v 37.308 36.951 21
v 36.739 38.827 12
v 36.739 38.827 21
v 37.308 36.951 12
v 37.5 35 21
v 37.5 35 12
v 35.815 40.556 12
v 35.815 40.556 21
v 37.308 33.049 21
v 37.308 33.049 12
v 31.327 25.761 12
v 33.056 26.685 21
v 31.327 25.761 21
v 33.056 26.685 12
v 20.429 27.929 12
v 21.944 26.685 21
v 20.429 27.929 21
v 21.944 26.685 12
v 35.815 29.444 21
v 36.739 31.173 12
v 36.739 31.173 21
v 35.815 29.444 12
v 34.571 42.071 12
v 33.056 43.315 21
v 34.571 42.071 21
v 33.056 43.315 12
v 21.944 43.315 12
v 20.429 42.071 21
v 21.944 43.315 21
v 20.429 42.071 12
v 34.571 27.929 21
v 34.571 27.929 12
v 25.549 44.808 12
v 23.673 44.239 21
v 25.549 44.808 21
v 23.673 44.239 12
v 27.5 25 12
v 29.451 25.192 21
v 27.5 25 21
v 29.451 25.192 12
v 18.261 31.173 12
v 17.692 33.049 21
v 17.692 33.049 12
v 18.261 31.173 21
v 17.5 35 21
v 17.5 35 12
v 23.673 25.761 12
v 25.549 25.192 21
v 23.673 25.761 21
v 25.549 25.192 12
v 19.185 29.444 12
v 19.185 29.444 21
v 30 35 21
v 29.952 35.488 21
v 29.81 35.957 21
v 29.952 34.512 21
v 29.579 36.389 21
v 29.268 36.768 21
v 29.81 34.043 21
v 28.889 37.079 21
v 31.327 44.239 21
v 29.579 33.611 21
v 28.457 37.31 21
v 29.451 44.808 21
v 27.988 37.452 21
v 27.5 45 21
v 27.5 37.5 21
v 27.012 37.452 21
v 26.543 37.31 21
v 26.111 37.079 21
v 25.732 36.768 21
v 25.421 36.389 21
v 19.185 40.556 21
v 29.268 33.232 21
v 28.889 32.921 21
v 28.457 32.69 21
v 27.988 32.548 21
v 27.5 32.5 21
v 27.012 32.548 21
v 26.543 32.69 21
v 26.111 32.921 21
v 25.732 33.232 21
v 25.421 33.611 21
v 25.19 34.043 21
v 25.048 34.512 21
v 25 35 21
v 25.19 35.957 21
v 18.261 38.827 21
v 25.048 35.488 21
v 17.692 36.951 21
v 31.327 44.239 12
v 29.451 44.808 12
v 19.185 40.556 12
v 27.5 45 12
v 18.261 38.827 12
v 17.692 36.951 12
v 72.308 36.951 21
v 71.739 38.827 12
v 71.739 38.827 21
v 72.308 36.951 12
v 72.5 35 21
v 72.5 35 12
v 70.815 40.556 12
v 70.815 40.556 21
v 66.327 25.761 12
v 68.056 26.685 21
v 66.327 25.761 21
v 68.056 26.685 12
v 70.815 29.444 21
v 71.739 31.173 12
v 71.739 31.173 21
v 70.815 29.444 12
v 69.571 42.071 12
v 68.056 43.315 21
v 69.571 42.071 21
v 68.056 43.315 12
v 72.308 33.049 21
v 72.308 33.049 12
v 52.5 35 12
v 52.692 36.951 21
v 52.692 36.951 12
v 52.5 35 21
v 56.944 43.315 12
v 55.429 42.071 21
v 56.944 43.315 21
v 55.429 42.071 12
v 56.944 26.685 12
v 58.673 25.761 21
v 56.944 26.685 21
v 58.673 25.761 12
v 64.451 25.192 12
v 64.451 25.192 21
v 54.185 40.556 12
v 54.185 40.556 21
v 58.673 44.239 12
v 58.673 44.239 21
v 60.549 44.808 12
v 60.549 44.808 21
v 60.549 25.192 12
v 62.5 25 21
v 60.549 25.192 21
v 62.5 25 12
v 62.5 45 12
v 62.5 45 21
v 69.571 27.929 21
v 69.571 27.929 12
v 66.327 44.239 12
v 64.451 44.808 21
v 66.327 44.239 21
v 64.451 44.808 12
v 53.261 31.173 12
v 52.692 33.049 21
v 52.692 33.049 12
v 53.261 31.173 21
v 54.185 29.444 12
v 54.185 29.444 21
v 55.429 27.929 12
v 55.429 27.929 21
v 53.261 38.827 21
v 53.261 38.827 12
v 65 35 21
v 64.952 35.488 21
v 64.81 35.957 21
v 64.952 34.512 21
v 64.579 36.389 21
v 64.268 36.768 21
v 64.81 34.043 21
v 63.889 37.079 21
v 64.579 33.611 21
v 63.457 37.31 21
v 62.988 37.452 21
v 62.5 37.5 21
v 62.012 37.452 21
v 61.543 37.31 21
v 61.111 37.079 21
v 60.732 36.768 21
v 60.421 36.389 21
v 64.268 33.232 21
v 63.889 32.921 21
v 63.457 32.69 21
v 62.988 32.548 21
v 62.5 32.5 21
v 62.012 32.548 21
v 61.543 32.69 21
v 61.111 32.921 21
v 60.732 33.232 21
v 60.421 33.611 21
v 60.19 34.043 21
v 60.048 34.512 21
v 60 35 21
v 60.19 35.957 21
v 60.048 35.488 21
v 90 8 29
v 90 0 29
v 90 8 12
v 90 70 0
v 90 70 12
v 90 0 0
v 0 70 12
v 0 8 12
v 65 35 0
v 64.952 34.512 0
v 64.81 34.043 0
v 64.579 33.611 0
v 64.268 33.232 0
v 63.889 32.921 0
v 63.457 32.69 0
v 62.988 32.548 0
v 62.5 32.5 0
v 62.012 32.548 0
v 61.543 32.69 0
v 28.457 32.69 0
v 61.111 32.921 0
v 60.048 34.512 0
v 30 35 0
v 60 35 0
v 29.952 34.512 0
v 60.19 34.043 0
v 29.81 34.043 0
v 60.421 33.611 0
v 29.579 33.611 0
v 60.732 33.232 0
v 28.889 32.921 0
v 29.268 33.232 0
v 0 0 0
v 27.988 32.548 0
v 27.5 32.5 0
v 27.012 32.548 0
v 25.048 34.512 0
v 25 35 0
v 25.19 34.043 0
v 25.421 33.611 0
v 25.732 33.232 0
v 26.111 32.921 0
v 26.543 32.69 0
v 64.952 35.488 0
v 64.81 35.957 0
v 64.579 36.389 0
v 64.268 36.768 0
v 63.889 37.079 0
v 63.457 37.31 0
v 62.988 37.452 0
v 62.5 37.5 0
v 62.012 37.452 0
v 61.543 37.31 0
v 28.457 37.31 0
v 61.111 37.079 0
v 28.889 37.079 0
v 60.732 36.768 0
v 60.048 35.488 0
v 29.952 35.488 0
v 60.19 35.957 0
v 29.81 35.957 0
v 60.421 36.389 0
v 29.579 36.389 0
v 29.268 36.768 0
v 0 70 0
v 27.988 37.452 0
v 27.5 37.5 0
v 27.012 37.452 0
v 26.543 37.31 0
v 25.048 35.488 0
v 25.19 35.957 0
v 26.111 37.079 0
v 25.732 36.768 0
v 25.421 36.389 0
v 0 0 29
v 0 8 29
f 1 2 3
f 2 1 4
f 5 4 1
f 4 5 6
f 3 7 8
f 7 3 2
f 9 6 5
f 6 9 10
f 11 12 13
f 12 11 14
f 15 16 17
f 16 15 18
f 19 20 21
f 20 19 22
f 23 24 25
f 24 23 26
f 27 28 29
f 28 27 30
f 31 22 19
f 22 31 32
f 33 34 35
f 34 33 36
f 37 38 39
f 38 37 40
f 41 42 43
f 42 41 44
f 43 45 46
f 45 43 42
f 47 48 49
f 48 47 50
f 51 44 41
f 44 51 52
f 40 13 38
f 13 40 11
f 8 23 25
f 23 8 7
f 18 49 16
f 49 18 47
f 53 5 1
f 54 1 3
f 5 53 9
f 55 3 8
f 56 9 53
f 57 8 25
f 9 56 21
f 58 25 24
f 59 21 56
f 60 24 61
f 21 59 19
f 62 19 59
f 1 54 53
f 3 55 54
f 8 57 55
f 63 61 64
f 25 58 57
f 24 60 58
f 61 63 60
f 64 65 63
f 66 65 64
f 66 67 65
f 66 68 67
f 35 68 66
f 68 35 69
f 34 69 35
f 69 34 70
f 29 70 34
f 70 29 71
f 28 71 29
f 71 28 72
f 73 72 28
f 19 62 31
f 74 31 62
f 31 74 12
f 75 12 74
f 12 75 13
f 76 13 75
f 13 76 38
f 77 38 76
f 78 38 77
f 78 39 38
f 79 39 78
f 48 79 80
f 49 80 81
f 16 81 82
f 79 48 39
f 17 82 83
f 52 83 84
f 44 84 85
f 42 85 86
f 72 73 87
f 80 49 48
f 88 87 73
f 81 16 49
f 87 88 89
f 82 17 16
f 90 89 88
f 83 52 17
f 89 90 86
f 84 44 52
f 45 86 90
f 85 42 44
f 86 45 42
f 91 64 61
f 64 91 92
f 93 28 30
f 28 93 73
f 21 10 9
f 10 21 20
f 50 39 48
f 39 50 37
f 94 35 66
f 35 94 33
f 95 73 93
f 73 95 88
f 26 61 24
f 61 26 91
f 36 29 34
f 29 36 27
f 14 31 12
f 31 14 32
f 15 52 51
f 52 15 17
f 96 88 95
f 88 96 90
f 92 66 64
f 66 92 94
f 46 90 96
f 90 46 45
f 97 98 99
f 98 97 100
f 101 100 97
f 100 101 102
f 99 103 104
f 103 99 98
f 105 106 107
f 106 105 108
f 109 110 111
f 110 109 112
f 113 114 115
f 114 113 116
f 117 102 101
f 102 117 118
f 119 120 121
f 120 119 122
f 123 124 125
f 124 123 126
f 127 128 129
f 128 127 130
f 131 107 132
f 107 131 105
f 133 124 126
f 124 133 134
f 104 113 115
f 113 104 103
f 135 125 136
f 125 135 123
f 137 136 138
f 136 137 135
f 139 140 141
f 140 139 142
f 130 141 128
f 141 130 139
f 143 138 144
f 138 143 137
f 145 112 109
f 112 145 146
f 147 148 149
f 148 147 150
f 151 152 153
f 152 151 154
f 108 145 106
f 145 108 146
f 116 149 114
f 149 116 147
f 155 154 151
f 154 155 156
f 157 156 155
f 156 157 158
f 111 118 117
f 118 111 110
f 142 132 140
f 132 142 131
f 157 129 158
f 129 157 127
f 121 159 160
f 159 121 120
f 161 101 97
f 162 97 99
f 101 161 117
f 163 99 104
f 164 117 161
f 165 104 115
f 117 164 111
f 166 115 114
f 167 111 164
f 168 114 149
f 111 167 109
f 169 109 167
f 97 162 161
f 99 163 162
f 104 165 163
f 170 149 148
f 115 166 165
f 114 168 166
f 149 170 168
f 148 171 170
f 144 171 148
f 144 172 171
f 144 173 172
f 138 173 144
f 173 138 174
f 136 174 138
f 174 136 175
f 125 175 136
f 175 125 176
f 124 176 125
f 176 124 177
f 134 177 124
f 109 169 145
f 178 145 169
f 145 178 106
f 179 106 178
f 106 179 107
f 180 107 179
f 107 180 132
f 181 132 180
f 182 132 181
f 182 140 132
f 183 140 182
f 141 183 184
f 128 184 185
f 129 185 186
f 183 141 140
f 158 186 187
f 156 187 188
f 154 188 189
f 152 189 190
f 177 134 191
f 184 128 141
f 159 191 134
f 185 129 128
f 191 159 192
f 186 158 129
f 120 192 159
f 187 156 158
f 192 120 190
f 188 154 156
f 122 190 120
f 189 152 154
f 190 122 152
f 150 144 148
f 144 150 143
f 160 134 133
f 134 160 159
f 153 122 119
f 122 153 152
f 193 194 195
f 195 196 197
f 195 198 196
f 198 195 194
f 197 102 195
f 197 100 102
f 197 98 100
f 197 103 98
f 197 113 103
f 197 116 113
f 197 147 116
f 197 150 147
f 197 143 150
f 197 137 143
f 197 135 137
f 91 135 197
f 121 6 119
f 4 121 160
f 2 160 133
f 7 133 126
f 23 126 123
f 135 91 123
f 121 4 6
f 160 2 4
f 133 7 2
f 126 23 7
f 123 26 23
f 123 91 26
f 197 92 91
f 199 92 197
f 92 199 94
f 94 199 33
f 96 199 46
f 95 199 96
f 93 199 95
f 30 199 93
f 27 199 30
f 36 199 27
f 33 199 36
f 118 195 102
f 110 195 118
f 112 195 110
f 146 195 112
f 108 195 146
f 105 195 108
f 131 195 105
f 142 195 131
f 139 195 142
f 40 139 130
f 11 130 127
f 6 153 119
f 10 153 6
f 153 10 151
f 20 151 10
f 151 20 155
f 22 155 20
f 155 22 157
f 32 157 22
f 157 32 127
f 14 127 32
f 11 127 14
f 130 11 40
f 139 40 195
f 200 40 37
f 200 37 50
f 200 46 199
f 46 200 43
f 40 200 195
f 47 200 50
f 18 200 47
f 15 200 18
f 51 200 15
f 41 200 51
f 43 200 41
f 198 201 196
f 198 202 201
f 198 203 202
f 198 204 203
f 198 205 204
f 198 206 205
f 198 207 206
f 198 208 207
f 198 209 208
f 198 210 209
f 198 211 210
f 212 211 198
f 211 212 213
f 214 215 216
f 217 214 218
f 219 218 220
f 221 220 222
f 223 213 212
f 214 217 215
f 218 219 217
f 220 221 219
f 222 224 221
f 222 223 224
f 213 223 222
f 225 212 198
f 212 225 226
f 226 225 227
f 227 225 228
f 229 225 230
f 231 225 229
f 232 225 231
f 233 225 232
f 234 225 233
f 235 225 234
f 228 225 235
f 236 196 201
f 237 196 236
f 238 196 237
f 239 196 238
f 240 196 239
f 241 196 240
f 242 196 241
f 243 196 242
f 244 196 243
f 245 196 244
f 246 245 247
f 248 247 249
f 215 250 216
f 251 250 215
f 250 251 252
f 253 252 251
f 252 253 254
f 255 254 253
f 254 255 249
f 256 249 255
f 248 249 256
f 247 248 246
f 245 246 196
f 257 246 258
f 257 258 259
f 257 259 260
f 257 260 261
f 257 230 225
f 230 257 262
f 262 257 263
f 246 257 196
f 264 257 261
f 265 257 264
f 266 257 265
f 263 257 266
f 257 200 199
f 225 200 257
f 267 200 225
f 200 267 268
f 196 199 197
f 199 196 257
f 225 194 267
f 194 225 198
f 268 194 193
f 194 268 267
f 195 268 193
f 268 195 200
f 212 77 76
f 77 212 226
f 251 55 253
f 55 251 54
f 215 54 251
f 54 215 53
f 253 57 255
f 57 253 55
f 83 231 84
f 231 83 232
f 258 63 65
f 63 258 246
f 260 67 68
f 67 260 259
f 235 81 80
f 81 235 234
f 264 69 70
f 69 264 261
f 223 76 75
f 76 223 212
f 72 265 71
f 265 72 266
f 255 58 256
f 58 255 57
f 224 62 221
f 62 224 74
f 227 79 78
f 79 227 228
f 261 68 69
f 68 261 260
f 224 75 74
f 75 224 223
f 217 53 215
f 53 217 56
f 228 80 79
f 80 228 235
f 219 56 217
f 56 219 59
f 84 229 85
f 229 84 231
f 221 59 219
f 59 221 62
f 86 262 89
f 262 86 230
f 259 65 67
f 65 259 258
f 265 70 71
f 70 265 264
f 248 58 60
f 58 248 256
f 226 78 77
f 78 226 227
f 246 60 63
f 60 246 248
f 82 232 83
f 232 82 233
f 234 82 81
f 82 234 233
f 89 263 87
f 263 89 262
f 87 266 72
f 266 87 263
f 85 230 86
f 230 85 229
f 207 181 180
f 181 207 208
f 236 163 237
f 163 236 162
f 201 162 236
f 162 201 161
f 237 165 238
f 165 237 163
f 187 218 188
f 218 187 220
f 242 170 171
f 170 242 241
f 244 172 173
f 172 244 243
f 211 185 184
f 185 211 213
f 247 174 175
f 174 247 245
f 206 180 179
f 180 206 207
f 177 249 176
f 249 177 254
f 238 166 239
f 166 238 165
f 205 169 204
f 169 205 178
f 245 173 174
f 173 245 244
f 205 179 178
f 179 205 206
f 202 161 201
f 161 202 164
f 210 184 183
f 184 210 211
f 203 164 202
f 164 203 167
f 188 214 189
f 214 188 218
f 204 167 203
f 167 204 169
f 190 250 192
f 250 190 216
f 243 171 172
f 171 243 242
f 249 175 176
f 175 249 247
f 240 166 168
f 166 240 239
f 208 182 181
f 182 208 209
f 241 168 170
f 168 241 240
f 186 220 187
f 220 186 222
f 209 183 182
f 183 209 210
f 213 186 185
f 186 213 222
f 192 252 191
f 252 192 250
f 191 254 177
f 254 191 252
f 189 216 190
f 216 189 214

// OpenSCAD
$fn = 32;

// ----------------------------------------------------------------------
// Drill jig: fence jig
// ----------------------------------------------------------------------

// --- parameters (mm) ---
plate_l = 90;             // plate length, X
plate_w = 70;             // plate width, Y
plate_t = 12;             // plate thickness
boss_d = 20;              // guide boss diameter
boss_h = 10;              // boss height above the plate
guide_d = 5;              // guide hole diameter
boss_pitch = 35;          // boss pitch
fence_h = 18;             // fence height above the plate
fence_t = 8;              // fence thickness

n_boss = 2;  // guide bosses
boss_x0 = (plate_l - (n_boss - 1) * boss_pitch) / 2;  // first boss X
boss_top = plate_t - 1 + boss_h;  // boss crown height
fence_top = plate_t - 1 + fence_h;  // fence crown height
total_h = max([fence_top, boss_top]);  // overall height

difference() {
  union() {
  cube([plate_l, plate_w, plate_t]);
  for (i = [0 : n_boss - 1])
    translate([boss_x0 + i * boss_pitch, plate_w / 2, plate_t - 1])
      cylinder(h = boss_h, d = boss_d);
  translate([0, 0, plate_t - 1]) cube([plate_l, fence_t, fence_h]);
  }
  for (i = [0 : n_boss - 1])
    translate([boss_x0 + i * boss_pitch, plate_w / 2, -1])
      cylinder(h = plate_t + boss_h, d = guide_d);
}
